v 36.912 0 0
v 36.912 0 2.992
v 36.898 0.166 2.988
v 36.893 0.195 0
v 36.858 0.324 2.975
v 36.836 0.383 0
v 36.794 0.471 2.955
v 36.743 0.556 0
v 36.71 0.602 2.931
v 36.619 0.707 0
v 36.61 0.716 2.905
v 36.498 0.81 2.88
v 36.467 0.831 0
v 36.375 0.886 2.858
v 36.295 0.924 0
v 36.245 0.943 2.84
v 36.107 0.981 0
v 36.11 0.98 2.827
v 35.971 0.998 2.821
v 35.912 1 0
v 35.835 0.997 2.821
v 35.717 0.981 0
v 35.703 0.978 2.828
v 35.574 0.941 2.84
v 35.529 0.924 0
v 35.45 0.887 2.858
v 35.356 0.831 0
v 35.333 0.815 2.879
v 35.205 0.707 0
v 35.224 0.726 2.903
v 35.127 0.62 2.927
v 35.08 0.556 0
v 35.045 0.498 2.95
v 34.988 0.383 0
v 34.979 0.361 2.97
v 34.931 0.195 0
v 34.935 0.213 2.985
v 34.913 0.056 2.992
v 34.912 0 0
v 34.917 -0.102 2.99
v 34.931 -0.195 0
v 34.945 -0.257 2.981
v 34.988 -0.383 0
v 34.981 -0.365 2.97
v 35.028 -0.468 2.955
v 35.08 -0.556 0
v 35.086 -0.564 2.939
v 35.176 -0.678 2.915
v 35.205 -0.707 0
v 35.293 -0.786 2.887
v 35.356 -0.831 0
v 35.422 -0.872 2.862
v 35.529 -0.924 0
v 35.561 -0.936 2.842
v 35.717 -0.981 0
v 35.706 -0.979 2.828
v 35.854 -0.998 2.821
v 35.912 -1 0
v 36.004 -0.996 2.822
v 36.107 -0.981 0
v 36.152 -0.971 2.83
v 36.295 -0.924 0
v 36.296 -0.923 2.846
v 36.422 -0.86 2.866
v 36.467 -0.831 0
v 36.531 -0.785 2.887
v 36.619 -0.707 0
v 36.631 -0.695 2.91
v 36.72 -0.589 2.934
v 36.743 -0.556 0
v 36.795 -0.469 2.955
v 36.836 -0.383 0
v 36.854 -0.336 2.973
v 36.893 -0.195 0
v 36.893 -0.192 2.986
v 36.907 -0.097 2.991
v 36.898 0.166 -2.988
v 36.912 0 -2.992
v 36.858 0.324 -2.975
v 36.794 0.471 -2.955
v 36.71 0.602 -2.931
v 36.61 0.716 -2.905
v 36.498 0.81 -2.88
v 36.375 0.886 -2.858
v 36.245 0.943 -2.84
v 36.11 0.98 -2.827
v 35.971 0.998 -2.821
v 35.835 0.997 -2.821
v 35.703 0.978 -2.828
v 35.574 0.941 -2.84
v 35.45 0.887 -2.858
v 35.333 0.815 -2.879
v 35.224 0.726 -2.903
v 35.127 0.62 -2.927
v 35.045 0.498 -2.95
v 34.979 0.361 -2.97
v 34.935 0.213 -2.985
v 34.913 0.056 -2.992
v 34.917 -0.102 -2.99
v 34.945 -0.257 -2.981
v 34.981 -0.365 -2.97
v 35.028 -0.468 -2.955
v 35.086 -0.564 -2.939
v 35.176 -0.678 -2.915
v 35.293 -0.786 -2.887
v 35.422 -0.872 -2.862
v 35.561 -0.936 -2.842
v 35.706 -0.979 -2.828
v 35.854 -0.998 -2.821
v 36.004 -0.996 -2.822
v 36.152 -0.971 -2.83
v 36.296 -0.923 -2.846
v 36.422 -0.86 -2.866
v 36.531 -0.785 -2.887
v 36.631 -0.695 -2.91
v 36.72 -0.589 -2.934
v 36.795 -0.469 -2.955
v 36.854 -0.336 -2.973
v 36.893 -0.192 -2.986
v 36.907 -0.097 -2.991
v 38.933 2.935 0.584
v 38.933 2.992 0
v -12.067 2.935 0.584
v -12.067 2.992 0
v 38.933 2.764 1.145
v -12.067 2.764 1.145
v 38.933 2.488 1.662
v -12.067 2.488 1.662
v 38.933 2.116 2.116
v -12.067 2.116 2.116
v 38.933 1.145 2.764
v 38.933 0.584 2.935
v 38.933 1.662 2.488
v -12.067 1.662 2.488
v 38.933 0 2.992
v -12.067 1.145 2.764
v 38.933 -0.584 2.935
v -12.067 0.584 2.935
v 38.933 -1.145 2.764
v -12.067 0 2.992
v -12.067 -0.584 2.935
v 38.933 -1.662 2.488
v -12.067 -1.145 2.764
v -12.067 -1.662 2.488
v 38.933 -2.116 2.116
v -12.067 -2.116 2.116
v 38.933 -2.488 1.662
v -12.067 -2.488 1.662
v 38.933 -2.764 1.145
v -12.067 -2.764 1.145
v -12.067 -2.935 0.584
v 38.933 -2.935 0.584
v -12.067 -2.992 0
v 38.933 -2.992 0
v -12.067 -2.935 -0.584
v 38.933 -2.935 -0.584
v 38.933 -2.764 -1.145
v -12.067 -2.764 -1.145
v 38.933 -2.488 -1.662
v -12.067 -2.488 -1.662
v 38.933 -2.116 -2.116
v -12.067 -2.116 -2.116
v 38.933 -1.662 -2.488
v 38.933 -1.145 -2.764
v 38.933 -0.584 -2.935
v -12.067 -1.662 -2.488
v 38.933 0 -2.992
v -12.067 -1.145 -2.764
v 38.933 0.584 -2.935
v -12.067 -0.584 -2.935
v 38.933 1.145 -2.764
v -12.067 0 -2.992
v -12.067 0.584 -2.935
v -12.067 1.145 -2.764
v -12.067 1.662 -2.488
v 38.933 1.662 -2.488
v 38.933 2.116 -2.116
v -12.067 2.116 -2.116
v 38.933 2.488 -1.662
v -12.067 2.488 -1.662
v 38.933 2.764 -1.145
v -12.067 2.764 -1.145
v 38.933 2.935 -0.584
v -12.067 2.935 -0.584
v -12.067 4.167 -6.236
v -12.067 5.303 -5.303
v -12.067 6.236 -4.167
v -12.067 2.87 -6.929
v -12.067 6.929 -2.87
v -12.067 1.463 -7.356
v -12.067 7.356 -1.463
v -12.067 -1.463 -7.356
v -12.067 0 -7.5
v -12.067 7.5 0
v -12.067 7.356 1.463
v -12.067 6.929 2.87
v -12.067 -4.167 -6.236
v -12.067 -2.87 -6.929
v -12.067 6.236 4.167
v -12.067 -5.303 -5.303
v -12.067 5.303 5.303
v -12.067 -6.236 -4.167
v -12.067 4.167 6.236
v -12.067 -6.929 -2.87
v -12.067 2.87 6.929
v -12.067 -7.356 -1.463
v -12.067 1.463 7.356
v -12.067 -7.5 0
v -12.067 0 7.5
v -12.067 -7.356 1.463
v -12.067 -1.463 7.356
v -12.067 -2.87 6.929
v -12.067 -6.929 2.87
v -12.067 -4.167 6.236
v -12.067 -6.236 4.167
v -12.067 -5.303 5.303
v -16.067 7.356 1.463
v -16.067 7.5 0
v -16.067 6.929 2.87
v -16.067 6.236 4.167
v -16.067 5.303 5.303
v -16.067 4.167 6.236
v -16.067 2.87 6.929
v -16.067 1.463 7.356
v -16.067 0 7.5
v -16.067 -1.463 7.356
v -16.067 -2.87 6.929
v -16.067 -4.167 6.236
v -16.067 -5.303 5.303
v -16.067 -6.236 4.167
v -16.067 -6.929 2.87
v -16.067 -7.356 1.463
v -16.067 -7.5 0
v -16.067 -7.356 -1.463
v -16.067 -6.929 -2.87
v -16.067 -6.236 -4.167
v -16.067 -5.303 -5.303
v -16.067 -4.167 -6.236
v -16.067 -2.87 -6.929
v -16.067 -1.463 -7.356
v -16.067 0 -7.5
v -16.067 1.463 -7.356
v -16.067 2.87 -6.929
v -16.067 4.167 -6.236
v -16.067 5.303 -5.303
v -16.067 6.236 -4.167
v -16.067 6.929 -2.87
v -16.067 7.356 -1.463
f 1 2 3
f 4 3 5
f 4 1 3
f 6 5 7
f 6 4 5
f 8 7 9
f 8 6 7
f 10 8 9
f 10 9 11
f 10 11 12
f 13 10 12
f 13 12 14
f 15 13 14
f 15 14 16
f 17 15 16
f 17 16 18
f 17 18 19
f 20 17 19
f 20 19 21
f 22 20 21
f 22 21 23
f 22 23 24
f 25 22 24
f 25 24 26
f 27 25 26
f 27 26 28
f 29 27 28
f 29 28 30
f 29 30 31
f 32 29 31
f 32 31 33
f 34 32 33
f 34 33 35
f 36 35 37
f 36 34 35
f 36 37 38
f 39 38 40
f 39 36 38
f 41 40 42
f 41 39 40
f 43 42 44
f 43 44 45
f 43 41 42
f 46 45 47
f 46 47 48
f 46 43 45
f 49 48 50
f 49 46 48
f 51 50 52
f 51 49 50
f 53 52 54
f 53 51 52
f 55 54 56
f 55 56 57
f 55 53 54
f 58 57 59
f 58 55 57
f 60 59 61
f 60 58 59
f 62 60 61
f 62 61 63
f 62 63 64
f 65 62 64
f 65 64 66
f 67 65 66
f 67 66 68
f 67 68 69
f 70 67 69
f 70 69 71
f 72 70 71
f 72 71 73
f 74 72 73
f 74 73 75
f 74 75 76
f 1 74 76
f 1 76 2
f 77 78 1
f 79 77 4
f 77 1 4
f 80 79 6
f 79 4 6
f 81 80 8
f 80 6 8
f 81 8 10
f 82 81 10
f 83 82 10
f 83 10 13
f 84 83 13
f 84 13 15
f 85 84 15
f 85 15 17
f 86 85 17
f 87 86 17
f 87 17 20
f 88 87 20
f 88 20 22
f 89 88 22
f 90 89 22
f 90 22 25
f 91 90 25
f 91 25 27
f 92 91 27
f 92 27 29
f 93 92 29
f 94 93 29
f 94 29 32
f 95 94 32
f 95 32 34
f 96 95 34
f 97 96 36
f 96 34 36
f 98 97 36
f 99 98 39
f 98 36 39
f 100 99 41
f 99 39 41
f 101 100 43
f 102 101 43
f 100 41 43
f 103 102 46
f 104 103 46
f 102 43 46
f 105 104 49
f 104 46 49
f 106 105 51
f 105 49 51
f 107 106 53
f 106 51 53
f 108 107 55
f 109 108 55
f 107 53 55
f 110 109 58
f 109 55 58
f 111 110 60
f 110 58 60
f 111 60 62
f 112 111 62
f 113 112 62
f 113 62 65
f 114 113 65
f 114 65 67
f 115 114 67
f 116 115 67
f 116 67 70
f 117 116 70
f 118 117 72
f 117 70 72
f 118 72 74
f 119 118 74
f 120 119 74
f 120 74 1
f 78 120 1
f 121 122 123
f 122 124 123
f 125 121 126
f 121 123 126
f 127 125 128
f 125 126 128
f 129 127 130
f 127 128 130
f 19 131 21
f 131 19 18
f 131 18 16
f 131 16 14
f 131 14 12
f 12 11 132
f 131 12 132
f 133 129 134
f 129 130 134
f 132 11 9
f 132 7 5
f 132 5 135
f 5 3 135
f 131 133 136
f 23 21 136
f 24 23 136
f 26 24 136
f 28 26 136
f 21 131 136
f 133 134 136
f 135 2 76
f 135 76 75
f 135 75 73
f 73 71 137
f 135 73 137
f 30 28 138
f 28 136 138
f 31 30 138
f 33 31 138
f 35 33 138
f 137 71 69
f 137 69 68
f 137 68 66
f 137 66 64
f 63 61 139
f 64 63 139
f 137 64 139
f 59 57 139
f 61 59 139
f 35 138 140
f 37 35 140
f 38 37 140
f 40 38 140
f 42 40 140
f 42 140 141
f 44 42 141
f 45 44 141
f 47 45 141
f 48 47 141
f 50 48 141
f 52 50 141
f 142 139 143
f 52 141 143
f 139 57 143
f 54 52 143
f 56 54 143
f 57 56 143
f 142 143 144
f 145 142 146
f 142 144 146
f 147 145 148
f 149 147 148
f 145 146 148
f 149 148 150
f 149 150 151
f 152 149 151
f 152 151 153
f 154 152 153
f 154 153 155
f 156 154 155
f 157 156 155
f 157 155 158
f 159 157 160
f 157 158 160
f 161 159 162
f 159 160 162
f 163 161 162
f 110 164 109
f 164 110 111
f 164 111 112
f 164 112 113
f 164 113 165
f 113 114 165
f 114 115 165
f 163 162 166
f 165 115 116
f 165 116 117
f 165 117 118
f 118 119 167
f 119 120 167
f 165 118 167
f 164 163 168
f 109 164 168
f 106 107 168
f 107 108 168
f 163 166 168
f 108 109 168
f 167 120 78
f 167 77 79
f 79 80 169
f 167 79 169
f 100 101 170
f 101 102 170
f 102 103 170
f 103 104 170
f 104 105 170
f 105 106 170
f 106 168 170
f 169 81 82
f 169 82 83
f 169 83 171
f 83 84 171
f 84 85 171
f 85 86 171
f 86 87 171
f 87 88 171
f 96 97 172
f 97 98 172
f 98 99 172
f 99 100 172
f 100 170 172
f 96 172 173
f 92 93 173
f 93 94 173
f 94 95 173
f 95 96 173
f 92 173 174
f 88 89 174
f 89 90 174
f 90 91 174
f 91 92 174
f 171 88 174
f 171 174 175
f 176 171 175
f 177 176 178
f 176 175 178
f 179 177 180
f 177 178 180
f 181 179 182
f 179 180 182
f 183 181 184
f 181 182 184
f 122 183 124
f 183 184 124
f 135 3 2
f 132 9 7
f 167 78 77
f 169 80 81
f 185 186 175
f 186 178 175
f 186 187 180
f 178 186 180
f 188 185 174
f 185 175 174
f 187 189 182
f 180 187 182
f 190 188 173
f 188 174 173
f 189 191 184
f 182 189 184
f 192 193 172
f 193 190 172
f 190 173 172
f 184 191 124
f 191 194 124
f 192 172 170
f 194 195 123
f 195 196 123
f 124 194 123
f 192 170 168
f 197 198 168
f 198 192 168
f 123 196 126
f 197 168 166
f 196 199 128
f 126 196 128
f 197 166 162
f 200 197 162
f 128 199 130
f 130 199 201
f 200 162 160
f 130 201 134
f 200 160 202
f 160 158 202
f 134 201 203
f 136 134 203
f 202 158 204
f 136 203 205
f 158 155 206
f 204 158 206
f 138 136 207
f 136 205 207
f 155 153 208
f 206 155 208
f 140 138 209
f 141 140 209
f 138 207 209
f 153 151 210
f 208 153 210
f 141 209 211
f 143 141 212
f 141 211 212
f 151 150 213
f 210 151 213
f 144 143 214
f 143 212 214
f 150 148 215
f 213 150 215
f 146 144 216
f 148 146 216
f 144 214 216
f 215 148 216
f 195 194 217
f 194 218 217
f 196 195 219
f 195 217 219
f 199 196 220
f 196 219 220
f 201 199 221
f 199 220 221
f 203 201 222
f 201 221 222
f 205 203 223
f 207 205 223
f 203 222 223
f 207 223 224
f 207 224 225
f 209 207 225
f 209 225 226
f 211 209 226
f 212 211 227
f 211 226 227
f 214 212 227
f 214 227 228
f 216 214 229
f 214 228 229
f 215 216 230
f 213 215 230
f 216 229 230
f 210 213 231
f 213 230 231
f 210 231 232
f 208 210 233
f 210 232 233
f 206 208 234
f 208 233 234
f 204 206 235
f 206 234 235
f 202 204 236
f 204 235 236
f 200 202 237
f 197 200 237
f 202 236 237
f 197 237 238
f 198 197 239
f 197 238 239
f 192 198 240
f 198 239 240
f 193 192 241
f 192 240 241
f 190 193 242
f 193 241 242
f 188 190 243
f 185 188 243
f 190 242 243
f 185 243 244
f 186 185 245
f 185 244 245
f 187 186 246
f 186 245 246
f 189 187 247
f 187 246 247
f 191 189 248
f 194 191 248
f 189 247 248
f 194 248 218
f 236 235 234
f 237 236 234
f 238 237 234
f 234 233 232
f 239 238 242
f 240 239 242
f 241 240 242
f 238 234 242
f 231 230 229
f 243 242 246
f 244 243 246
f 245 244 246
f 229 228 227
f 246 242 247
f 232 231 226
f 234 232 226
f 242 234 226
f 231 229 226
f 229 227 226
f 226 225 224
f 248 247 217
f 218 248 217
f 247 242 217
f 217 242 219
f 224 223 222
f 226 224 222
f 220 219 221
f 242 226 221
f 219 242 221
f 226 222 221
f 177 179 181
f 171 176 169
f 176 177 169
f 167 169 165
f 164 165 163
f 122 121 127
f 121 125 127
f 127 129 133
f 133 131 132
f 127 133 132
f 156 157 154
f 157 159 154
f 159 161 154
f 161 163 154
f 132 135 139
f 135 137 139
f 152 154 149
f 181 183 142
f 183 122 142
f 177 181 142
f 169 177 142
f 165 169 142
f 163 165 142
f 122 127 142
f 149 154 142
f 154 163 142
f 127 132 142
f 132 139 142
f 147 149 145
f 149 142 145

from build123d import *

# Parameters (mm, degrees)
SKETCH2_R               = 1
CUT_EXTRUDE2_DEPTH      = 8.5
CUT_EXTRUDE2_DEPTH_BACK = 8.5


with BuildPart() as part:
    # Sketch1 → Revolve2 (revolve)
    with BuildSketch(Plane.XY):
        Polygon((-16.067192276, 0), (38.932807724, 0), (38.932807724, 2.992227979), (-12.067192276, 2.992227979), (-12.067192276, 7.5), (-16.067192276, 7.5), align=None)
    revolve(axis=Axis((-16.067192276, 0, 0), (1, 0, 0)))

    # Sketch2 → Cut-Extrude2 (cut, two sides)
    with BuildSketch(Plane.XY) as cut_extrude2_sk:
        with Locations((35.91188951, 0)):
            Circle(SKETCH2_R)
    extrude(amount=CUT_EXTRUDE2_DEPTH, mode=Mode.SUBTRACT)
    extrude(cut_extrude2_sk.sketch, amount=-CUT_EXTRUDE2_DEPTH_BACK, mode=Mode.SUBTRACT)


solid = part.part
